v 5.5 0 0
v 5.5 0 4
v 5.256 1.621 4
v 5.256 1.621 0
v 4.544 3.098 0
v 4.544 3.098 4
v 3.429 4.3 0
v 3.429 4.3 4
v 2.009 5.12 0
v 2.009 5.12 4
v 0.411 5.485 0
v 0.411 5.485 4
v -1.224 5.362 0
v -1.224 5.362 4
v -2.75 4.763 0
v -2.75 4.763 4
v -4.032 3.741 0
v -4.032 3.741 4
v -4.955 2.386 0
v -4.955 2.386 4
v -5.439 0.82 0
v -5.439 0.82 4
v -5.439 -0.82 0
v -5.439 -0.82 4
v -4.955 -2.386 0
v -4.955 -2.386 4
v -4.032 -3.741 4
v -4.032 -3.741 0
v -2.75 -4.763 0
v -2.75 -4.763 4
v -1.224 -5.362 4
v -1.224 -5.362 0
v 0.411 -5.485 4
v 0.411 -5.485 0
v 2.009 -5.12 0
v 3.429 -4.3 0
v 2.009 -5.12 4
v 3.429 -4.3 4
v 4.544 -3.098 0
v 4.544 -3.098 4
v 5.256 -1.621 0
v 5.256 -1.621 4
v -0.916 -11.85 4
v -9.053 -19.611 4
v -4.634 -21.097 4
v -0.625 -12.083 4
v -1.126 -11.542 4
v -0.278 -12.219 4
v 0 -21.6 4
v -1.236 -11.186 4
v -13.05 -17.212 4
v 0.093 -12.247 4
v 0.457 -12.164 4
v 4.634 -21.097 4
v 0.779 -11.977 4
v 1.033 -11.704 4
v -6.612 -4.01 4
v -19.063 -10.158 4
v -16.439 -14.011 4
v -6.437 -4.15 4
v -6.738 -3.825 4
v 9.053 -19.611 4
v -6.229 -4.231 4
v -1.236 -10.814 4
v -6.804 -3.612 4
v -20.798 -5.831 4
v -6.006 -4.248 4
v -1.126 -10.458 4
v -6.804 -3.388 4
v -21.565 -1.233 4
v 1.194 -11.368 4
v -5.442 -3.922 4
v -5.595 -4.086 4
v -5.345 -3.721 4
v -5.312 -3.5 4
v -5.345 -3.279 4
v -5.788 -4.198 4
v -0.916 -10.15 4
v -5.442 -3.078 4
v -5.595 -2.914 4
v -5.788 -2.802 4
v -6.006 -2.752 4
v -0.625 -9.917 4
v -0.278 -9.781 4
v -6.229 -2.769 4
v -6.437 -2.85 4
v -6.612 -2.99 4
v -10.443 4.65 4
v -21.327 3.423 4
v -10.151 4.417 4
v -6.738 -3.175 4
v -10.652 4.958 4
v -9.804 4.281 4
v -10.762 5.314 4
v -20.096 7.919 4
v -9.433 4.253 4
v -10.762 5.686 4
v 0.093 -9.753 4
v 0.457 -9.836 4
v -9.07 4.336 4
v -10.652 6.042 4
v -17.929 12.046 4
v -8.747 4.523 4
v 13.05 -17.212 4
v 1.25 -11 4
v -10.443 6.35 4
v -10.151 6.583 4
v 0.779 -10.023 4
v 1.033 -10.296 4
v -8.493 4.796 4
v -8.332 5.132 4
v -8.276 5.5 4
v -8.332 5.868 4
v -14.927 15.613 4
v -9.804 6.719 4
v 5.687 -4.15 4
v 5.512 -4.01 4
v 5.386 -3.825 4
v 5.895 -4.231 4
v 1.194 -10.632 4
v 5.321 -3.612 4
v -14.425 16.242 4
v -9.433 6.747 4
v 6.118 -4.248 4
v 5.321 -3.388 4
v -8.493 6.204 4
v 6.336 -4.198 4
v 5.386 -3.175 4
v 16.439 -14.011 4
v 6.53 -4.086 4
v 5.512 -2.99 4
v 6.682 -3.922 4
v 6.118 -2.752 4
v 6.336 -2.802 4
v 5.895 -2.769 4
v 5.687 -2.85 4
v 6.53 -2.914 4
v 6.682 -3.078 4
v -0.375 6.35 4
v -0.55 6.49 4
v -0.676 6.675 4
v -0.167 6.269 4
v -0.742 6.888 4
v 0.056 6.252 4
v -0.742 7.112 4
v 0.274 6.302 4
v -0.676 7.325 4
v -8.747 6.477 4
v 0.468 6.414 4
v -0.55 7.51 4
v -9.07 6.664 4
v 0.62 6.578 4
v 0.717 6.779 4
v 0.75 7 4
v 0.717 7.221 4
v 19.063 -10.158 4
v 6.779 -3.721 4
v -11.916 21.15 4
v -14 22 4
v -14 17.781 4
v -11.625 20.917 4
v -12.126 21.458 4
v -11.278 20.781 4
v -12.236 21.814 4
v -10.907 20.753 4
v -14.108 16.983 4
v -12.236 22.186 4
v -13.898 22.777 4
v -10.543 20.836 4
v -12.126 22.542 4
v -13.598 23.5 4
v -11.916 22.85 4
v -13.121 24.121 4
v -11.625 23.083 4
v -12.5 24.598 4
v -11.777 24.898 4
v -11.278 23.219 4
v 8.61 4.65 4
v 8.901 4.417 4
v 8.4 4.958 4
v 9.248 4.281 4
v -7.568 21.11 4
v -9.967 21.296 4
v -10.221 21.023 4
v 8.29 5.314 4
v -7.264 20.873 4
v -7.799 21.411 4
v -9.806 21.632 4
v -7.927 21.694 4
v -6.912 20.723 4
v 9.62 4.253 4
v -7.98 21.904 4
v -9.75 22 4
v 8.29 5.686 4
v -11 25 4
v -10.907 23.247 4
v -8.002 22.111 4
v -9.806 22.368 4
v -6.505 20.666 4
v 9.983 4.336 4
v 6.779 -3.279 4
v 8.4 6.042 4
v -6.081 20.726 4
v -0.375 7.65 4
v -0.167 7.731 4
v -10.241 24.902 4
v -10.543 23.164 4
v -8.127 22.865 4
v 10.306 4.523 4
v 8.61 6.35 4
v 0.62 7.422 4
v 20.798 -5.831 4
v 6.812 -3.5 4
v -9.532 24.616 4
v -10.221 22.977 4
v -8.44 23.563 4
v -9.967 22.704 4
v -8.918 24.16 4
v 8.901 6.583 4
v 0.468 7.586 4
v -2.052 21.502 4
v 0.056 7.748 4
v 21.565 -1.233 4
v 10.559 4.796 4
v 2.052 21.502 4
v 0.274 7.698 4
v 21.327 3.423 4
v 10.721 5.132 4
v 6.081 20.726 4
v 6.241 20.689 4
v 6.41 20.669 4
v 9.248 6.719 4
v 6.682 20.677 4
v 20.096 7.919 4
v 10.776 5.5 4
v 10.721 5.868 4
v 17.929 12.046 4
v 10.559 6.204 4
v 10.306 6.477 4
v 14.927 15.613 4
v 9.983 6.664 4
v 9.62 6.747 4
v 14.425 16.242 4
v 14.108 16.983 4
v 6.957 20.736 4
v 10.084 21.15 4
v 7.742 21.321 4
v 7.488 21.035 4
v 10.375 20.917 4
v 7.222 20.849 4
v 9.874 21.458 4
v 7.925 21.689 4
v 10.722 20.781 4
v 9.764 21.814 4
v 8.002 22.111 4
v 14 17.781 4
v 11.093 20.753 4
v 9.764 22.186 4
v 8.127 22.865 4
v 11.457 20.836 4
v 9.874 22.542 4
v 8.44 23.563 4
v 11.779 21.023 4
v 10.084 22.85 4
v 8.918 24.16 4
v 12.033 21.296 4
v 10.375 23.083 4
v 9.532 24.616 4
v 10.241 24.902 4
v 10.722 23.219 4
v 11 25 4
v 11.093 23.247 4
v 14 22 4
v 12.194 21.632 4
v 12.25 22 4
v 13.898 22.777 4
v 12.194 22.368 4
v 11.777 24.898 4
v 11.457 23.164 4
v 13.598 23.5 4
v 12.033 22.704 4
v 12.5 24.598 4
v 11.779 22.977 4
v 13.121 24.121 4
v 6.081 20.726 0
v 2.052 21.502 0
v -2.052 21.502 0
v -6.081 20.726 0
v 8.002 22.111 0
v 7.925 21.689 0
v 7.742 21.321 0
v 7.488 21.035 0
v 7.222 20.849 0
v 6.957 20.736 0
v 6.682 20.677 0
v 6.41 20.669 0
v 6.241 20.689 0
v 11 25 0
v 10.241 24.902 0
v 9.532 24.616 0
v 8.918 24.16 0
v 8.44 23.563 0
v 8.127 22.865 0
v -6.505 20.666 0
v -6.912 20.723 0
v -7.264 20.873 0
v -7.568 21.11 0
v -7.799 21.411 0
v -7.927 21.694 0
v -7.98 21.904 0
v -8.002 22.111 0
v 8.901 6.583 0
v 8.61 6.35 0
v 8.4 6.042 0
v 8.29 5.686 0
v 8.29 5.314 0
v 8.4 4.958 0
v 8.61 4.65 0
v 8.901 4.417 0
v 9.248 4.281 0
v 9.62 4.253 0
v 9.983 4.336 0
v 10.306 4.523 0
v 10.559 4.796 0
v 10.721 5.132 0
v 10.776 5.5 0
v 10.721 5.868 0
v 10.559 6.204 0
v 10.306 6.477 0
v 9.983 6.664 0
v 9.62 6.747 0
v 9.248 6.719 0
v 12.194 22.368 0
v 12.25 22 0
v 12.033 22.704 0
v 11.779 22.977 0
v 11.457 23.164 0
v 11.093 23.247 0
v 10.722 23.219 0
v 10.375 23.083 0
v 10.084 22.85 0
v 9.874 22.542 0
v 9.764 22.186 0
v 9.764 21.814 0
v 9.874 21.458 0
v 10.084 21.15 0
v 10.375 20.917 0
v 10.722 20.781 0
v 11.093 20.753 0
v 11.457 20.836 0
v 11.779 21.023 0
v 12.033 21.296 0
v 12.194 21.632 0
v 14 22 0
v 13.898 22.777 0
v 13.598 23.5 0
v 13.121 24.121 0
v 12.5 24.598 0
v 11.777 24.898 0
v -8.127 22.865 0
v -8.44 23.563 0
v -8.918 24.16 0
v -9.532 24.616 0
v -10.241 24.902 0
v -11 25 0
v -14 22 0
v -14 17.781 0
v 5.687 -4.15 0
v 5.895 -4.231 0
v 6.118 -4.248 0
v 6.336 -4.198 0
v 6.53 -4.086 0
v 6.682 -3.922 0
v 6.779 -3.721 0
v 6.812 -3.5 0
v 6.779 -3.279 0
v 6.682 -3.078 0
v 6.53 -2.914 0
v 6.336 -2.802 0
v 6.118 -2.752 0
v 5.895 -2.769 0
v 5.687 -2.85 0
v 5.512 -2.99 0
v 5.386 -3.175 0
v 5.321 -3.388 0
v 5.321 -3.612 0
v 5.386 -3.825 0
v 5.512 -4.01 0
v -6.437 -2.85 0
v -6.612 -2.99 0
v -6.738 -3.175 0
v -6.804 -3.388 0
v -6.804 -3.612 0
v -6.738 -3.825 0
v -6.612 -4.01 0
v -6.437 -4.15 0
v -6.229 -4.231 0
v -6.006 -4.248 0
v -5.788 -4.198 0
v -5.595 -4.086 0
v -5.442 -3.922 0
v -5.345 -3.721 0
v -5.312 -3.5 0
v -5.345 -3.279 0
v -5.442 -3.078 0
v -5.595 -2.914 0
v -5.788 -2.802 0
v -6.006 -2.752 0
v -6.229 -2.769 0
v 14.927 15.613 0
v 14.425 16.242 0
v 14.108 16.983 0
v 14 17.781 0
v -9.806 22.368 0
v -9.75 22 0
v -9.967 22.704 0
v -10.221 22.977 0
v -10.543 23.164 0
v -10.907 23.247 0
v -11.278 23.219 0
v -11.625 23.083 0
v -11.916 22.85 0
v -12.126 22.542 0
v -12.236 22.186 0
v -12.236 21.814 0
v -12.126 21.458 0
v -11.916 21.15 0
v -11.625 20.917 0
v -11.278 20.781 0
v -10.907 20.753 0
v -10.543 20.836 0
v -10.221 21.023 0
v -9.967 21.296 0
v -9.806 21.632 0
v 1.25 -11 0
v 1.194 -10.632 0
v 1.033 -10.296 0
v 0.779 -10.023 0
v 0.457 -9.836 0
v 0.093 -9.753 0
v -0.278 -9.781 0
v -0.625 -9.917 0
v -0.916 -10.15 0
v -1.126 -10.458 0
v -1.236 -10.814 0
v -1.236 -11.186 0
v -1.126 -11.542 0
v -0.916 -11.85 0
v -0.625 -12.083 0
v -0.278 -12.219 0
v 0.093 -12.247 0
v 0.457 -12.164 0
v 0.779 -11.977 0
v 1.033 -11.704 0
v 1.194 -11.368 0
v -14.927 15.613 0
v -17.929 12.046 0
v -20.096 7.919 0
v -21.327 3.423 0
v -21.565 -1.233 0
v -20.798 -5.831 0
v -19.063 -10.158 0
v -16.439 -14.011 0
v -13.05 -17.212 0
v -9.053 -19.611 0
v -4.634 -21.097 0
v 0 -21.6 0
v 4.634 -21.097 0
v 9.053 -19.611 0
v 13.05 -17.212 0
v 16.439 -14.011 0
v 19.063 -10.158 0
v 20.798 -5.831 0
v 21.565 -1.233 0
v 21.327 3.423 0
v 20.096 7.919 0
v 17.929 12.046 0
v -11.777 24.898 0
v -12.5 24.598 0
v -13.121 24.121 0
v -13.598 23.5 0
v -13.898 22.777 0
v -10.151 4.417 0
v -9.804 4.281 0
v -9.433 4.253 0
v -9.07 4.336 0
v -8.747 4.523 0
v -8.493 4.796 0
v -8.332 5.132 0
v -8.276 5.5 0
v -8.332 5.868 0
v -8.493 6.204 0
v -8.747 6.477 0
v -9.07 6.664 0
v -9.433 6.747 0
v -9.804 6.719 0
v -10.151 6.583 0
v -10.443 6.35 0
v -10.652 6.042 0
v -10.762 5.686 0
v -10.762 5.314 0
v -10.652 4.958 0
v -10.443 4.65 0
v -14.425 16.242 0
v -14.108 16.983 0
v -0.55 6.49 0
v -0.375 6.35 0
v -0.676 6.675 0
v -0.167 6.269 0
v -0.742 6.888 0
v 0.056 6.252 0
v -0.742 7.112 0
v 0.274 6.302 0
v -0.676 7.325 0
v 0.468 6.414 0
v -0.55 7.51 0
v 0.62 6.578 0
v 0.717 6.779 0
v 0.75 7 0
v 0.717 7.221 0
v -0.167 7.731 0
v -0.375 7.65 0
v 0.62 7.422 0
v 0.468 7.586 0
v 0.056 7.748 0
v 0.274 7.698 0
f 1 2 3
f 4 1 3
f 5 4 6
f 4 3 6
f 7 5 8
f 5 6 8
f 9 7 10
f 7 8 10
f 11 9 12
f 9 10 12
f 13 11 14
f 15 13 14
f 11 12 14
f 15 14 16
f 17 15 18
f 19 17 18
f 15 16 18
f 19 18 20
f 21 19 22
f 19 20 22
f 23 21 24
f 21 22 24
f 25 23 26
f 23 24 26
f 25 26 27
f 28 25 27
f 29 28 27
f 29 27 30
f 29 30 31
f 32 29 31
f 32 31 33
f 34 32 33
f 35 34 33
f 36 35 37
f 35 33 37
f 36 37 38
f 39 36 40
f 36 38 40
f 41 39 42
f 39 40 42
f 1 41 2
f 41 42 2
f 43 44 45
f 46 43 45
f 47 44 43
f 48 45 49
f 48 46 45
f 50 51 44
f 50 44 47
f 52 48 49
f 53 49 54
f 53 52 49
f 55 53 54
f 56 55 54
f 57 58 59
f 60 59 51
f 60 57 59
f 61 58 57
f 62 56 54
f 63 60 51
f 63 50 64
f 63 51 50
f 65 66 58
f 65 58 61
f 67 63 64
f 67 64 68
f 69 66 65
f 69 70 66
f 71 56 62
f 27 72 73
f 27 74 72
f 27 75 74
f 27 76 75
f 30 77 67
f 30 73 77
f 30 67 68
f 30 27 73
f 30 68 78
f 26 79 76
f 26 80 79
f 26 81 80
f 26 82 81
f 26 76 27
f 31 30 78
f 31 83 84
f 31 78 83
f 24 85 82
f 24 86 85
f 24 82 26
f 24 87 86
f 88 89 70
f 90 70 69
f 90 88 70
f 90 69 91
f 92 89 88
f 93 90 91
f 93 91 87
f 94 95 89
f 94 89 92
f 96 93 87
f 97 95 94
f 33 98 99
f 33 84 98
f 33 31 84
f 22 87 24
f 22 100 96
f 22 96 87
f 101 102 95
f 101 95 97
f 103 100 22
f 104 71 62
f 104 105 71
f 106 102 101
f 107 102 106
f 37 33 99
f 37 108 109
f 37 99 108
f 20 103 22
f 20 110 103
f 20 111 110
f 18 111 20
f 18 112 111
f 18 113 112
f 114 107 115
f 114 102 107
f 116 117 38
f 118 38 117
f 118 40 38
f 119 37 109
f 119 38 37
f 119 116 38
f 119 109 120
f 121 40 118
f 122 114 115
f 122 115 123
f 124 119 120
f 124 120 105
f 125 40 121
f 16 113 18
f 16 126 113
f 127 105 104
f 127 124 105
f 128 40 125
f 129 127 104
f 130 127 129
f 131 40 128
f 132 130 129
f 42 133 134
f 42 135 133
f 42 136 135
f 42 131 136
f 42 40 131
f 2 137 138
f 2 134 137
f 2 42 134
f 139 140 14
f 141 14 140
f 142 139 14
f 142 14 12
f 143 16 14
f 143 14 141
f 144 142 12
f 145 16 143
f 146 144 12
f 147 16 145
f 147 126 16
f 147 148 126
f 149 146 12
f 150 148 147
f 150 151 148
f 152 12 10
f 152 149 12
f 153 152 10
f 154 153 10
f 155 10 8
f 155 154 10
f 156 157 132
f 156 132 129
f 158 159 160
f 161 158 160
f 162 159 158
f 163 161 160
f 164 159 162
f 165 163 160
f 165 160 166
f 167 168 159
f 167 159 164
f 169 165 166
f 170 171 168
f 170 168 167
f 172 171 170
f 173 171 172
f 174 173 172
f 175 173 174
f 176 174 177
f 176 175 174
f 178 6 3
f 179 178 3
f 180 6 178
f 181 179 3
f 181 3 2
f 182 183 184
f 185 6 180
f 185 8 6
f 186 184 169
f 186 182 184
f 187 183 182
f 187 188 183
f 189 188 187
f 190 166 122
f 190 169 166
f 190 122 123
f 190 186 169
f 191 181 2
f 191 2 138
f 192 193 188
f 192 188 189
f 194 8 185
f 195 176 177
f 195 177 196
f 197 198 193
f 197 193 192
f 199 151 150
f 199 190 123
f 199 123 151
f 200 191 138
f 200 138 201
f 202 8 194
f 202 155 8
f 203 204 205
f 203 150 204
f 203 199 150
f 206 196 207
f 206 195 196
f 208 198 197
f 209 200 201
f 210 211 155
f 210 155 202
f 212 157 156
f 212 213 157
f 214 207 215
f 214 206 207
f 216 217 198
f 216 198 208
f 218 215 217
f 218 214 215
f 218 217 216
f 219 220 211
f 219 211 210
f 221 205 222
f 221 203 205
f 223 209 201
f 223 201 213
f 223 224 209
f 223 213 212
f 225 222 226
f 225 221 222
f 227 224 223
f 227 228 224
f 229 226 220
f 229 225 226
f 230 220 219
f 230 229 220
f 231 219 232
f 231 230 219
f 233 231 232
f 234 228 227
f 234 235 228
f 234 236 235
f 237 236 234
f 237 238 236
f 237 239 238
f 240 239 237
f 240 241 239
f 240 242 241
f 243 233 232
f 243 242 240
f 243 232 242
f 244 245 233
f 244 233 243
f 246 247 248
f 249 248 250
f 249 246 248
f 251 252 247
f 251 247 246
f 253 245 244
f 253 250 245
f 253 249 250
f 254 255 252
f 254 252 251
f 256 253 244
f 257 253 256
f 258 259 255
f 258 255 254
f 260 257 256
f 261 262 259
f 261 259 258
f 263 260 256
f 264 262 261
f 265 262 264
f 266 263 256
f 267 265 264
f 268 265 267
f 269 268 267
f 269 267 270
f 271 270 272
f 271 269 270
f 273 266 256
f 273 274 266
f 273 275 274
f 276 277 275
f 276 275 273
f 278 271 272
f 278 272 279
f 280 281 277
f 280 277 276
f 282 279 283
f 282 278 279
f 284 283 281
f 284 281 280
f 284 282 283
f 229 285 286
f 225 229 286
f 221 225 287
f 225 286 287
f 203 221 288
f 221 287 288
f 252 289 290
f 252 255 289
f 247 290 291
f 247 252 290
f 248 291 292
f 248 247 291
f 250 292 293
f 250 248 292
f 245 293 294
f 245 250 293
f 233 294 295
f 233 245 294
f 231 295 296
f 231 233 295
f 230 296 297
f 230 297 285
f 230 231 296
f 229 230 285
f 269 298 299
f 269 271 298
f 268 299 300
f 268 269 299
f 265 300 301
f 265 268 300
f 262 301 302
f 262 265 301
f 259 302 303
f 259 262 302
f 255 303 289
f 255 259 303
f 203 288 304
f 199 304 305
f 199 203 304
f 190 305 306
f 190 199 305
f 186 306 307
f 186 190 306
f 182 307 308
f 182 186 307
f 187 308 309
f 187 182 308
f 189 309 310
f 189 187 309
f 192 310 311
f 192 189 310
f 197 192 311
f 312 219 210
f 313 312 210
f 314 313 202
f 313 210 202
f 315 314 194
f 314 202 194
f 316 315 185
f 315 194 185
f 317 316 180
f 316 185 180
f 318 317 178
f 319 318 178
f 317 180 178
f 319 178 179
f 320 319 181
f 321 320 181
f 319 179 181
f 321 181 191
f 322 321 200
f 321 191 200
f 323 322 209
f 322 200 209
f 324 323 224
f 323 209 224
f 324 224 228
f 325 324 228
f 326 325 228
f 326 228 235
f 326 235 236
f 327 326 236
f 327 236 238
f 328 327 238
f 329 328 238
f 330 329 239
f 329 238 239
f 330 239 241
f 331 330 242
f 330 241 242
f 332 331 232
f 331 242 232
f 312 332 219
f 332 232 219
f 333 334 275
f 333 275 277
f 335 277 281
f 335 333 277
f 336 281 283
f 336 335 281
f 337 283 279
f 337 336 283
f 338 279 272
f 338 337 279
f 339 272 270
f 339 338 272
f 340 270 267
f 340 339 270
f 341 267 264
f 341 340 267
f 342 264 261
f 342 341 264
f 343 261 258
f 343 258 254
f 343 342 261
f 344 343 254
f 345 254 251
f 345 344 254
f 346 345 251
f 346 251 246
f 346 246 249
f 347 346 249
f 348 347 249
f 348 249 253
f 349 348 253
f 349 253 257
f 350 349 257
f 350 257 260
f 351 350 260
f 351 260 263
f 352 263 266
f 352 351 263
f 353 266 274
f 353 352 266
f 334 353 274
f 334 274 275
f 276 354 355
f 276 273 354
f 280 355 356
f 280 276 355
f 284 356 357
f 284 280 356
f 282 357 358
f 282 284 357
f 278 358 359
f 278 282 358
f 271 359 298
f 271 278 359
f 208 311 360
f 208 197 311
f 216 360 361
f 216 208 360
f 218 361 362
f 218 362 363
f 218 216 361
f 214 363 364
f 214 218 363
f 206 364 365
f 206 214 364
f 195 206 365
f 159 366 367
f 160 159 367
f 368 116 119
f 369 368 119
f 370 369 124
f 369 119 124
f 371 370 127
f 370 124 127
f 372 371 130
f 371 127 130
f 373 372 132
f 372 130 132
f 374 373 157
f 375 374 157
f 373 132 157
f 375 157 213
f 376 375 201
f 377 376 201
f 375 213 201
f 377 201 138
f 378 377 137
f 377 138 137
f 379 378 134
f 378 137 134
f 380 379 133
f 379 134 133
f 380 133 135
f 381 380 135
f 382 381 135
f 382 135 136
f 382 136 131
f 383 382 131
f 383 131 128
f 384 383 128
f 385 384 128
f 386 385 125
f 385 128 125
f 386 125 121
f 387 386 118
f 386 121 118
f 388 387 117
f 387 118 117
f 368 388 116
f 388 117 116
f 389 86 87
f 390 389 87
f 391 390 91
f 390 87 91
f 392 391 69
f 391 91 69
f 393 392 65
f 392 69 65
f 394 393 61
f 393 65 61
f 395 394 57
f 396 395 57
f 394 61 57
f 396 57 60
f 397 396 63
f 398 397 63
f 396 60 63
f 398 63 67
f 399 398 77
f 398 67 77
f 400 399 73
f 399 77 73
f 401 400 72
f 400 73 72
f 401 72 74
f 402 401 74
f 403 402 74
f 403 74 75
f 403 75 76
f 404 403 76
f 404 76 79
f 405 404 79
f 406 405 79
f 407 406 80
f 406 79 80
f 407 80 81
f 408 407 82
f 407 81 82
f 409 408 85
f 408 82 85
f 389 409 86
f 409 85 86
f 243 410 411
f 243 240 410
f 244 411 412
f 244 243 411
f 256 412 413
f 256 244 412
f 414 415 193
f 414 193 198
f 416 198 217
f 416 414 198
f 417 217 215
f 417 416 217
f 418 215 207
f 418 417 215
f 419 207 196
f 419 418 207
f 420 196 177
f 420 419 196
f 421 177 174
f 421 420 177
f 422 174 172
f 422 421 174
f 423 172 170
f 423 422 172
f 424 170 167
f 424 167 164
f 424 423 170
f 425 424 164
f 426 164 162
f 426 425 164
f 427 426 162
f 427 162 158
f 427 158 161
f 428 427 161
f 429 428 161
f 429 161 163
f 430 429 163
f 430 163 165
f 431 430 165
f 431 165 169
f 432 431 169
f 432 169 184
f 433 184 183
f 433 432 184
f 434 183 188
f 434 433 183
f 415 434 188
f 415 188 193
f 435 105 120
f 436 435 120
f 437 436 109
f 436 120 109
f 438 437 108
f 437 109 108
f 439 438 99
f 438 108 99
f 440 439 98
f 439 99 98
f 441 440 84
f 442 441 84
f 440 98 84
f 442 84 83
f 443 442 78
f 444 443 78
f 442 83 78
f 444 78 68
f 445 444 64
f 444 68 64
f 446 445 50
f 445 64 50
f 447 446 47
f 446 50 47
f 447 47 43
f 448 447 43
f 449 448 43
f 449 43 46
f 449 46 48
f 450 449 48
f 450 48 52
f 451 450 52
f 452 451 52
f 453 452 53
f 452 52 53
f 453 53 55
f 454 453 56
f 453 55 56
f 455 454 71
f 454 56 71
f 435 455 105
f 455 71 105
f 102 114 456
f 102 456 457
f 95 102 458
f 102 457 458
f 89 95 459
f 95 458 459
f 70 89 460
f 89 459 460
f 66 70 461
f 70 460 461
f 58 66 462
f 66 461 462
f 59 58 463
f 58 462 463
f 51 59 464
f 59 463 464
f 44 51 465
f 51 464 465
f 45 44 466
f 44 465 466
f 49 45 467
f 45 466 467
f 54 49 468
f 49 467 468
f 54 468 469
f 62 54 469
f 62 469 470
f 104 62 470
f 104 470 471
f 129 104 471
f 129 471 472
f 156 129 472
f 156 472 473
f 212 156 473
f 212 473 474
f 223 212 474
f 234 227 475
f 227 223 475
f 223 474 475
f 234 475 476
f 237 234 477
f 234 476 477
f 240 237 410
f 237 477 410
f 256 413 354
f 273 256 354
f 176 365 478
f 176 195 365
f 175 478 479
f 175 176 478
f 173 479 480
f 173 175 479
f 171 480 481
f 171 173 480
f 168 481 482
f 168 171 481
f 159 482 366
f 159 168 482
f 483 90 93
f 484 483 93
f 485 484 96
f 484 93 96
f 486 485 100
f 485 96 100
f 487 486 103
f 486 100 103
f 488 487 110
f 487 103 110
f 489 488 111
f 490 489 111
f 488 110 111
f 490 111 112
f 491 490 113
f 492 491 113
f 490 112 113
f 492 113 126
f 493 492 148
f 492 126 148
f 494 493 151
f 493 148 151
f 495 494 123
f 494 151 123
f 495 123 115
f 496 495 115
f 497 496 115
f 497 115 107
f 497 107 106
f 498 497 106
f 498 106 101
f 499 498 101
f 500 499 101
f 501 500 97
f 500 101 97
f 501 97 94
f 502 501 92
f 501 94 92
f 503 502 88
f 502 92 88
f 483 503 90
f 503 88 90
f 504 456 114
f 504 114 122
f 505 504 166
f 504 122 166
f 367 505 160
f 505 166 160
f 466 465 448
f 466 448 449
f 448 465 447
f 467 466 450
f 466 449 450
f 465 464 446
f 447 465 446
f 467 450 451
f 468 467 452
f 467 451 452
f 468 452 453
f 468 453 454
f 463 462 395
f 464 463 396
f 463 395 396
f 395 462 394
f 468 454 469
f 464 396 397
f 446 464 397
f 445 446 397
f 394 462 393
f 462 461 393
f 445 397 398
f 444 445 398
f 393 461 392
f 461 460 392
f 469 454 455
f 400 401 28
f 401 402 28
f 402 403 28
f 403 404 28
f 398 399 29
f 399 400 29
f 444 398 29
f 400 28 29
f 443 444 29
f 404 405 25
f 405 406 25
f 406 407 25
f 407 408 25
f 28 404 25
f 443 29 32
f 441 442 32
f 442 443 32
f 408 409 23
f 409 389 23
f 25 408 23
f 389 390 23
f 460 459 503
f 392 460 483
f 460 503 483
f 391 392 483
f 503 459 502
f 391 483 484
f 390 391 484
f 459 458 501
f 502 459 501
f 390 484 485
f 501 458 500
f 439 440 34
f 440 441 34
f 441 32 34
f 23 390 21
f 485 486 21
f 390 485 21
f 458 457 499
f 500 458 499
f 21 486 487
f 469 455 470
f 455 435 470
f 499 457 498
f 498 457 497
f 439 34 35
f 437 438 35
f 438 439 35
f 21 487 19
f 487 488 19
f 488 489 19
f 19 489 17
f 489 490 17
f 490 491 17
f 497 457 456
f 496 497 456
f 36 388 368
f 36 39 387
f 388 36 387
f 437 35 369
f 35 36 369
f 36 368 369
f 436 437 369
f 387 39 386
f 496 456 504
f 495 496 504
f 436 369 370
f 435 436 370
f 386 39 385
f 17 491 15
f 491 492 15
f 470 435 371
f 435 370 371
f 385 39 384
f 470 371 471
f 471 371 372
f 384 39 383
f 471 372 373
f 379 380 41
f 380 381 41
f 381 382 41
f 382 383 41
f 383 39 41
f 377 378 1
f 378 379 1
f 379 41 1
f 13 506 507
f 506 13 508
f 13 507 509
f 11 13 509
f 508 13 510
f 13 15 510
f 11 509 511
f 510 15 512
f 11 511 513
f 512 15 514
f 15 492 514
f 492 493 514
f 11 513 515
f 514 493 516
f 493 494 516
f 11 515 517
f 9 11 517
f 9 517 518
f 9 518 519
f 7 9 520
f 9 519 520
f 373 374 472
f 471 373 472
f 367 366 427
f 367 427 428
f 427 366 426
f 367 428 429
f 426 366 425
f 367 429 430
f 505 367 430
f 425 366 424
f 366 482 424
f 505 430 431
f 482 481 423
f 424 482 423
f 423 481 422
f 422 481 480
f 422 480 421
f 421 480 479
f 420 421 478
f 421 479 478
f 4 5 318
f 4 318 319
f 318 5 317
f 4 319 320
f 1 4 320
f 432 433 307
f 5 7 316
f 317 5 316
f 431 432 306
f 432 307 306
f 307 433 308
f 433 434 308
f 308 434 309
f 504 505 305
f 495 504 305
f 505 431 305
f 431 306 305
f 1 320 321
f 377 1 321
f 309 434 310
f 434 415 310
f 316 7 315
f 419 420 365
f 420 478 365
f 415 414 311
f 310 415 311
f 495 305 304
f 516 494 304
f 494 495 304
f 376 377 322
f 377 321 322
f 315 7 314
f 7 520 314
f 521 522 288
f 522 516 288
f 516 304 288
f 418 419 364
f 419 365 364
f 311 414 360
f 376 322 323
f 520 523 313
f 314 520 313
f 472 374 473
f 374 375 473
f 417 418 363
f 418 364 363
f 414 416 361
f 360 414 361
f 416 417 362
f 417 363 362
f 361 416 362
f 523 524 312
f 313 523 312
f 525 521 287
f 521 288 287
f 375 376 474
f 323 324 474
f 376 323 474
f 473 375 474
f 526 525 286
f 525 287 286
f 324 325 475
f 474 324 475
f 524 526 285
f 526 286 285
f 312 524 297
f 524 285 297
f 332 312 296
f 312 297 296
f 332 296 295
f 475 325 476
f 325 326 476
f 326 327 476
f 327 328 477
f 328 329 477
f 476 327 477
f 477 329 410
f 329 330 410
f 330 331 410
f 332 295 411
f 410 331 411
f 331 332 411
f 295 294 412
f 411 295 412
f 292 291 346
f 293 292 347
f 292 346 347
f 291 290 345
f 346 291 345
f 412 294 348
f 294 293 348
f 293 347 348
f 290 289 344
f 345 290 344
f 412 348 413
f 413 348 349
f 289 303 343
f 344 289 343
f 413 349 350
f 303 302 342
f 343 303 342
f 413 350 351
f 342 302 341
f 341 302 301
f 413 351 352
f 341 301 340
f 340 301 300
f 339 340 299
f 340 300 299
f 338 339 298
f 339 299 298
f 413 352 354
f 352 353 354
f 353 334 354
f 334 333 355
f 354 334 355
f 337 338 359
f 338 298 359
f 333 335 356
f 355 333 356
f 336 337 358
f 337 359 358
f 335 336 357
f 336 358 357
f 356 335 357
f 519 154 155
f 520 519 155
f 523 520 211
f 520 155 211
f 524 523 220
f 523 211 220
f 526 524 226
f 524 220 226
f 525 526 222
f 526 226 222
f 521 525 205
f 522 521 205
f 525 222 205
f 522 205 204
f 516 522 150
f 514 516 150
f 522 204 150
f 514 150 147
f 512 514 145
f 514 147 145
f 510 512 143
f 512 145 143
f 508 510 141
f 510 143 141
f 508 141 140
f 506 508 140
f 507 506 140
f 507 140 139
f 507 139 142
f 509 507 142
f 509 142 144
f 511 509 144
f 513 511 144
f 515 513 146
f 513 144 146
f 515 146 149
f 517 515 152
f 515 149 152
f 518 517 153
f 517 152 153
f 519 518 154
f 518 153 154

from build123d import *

# Parameters (mm, degrees)
SKETCH1_R         = 21.6
EXTRUDE1_DEPTH    = 4
EXTRUDE2_START    = -4
SKETCH2_R         = 1.25
EXTRUDE2_DEPTH    = 4
FILLET1_R         = 3
FILLET2_R         = 1.5
SKETCH3_R         = 5.5
EXTRUDE3_DEPTH    = 4
SKETCH4_R         = 0.75
EXTRUDE4_DEPTH    = 4
CIRPATTERN1_COUNT = 3
SKETCH5_R         = 1.25
EXTRUDE5_DEPTH    = 4
CIRPATTERN2_COUNT = 3


with BuildPart() as part:
    # Sketch1 → Extrude1 (new body)
    with BuildSketch(Plane.XY):
        Circle(SKETCH1_R)
    extrude(amount=EXTRUDE1_DEPTH)

    # Sketch2 → Extrude2 (add)
    # profile 1 of 2: a face of its own
    with BuildSketch(Plane.XY.offset(4).offset(EXTRUDE2_START)):
        with BuildLine():
            Line((8, 25), (8, 20.063897926))
            ThreePointArc((8, 20.063897926), (11.147528841, 18.501151335), (14, 16.448708156))
            Line((14, 16.448708156), (14, 25))
            Line((14, 25), (8, 25))
        make_face()
        with Locations((11, 22)):
            Circle(SKETCH2_R, mode=Mode.SUBTRACT)
    # profile 2 of 2: a face of its own
    with BuildSketch(Plane.XY.offset(4).offset(EXTRUDE2_START)):
        with BuildLine():
            Line((-14, 25), (-14, 16.448708156))
            ThreePointArc((-14, 16.448708156), (-11.147528841, 18.501151335), (-8, 20.063897926))
            Line((-8, 20.063897926), (-8, 25))
            Line((-8, 25), (-14, 25))
        make_face()
        with Locations((-11, 22)):
            Circle(SKETCH2_R, mode=Mode.SUBTRACT)
    extrude(amount=EXTRUDE2_DEPTH)

    # Fillet1
    fillet1_edges = [part.edges().sort_by_distance(p)[0] for p in [
        (14, 16.448708156, 2),
        (-14, 16.448708156, 2),
        (14, 25, 2),
        (8, 25, 2),
        (-8, 25, 2),
        (-14, 25, 2),
    ]]
    fillet(fillet1_edges, radius=FILLET1_R - 0.0001)  # a hair under: the kernel refuses the full size

    # Fillet2
    fillet2_edges = [part.edges().sort_by_distance(p)[0] for p in [
        (8, 20.063897926, 2),
        (-8, 20.063897926, 2),
    ]]
    fillet(fillet2_edges, radius=FILLET2_R)

    # Sketch3 → Extrude3 (cut)
    with BuildSketch(Plane.XY.offset(4)):
        Circle(SKETCH3_R)
    extrude(amount=-EXTRUDE3_DEPTH, mode=Mode.SUBTRACT)

    # Sketch4 → Extrude4 (cut)
    with BuildSketch(Plane.XY.offset(4)):
        with Locations((0, 7)):
            Circle(SKETCH4_R)
    extrude4 = extrude(amount=-EXTRUDE4_DEPTH, mode=Mode.SUBTRACT)

    # CirPattern1: Extrude4 ×3 about axis
    cirpattern1_axis = Axis((0, 0, 0), (0, 0, 1))
    for i in range(1, CIRPATTERN1_COUNT):
        add(extrude4.rotate(cirpattern1_axis, i * 360 / CIRPATTERN1_COUNT), mode=Mode.SUBTRACT)

    # Sketch5 → Extrude5 (cut)
    with BuildSketch(Plane.XY.offset(4)):
        with Locations((0, -11)):
            Circle(SKETCH5_R)
    extrude5 = extrude(amount=-EXTRUDE5_DEPTH, mode=Mode.SUBTRACT)

    # CirPattern2: Extrude5 ×3 about axis
    cirpattern2_axis = Axis((0, 0, 0), (0, 0, 1))
    for i in range(1, CIRPATTERN2_COUNT):
        add(extrude5.rotate(cirpattern2_axis, i * 360 / CIRPATTERN2_COUNT), mode=Mode.SUBTRACT)


solid = part.part
